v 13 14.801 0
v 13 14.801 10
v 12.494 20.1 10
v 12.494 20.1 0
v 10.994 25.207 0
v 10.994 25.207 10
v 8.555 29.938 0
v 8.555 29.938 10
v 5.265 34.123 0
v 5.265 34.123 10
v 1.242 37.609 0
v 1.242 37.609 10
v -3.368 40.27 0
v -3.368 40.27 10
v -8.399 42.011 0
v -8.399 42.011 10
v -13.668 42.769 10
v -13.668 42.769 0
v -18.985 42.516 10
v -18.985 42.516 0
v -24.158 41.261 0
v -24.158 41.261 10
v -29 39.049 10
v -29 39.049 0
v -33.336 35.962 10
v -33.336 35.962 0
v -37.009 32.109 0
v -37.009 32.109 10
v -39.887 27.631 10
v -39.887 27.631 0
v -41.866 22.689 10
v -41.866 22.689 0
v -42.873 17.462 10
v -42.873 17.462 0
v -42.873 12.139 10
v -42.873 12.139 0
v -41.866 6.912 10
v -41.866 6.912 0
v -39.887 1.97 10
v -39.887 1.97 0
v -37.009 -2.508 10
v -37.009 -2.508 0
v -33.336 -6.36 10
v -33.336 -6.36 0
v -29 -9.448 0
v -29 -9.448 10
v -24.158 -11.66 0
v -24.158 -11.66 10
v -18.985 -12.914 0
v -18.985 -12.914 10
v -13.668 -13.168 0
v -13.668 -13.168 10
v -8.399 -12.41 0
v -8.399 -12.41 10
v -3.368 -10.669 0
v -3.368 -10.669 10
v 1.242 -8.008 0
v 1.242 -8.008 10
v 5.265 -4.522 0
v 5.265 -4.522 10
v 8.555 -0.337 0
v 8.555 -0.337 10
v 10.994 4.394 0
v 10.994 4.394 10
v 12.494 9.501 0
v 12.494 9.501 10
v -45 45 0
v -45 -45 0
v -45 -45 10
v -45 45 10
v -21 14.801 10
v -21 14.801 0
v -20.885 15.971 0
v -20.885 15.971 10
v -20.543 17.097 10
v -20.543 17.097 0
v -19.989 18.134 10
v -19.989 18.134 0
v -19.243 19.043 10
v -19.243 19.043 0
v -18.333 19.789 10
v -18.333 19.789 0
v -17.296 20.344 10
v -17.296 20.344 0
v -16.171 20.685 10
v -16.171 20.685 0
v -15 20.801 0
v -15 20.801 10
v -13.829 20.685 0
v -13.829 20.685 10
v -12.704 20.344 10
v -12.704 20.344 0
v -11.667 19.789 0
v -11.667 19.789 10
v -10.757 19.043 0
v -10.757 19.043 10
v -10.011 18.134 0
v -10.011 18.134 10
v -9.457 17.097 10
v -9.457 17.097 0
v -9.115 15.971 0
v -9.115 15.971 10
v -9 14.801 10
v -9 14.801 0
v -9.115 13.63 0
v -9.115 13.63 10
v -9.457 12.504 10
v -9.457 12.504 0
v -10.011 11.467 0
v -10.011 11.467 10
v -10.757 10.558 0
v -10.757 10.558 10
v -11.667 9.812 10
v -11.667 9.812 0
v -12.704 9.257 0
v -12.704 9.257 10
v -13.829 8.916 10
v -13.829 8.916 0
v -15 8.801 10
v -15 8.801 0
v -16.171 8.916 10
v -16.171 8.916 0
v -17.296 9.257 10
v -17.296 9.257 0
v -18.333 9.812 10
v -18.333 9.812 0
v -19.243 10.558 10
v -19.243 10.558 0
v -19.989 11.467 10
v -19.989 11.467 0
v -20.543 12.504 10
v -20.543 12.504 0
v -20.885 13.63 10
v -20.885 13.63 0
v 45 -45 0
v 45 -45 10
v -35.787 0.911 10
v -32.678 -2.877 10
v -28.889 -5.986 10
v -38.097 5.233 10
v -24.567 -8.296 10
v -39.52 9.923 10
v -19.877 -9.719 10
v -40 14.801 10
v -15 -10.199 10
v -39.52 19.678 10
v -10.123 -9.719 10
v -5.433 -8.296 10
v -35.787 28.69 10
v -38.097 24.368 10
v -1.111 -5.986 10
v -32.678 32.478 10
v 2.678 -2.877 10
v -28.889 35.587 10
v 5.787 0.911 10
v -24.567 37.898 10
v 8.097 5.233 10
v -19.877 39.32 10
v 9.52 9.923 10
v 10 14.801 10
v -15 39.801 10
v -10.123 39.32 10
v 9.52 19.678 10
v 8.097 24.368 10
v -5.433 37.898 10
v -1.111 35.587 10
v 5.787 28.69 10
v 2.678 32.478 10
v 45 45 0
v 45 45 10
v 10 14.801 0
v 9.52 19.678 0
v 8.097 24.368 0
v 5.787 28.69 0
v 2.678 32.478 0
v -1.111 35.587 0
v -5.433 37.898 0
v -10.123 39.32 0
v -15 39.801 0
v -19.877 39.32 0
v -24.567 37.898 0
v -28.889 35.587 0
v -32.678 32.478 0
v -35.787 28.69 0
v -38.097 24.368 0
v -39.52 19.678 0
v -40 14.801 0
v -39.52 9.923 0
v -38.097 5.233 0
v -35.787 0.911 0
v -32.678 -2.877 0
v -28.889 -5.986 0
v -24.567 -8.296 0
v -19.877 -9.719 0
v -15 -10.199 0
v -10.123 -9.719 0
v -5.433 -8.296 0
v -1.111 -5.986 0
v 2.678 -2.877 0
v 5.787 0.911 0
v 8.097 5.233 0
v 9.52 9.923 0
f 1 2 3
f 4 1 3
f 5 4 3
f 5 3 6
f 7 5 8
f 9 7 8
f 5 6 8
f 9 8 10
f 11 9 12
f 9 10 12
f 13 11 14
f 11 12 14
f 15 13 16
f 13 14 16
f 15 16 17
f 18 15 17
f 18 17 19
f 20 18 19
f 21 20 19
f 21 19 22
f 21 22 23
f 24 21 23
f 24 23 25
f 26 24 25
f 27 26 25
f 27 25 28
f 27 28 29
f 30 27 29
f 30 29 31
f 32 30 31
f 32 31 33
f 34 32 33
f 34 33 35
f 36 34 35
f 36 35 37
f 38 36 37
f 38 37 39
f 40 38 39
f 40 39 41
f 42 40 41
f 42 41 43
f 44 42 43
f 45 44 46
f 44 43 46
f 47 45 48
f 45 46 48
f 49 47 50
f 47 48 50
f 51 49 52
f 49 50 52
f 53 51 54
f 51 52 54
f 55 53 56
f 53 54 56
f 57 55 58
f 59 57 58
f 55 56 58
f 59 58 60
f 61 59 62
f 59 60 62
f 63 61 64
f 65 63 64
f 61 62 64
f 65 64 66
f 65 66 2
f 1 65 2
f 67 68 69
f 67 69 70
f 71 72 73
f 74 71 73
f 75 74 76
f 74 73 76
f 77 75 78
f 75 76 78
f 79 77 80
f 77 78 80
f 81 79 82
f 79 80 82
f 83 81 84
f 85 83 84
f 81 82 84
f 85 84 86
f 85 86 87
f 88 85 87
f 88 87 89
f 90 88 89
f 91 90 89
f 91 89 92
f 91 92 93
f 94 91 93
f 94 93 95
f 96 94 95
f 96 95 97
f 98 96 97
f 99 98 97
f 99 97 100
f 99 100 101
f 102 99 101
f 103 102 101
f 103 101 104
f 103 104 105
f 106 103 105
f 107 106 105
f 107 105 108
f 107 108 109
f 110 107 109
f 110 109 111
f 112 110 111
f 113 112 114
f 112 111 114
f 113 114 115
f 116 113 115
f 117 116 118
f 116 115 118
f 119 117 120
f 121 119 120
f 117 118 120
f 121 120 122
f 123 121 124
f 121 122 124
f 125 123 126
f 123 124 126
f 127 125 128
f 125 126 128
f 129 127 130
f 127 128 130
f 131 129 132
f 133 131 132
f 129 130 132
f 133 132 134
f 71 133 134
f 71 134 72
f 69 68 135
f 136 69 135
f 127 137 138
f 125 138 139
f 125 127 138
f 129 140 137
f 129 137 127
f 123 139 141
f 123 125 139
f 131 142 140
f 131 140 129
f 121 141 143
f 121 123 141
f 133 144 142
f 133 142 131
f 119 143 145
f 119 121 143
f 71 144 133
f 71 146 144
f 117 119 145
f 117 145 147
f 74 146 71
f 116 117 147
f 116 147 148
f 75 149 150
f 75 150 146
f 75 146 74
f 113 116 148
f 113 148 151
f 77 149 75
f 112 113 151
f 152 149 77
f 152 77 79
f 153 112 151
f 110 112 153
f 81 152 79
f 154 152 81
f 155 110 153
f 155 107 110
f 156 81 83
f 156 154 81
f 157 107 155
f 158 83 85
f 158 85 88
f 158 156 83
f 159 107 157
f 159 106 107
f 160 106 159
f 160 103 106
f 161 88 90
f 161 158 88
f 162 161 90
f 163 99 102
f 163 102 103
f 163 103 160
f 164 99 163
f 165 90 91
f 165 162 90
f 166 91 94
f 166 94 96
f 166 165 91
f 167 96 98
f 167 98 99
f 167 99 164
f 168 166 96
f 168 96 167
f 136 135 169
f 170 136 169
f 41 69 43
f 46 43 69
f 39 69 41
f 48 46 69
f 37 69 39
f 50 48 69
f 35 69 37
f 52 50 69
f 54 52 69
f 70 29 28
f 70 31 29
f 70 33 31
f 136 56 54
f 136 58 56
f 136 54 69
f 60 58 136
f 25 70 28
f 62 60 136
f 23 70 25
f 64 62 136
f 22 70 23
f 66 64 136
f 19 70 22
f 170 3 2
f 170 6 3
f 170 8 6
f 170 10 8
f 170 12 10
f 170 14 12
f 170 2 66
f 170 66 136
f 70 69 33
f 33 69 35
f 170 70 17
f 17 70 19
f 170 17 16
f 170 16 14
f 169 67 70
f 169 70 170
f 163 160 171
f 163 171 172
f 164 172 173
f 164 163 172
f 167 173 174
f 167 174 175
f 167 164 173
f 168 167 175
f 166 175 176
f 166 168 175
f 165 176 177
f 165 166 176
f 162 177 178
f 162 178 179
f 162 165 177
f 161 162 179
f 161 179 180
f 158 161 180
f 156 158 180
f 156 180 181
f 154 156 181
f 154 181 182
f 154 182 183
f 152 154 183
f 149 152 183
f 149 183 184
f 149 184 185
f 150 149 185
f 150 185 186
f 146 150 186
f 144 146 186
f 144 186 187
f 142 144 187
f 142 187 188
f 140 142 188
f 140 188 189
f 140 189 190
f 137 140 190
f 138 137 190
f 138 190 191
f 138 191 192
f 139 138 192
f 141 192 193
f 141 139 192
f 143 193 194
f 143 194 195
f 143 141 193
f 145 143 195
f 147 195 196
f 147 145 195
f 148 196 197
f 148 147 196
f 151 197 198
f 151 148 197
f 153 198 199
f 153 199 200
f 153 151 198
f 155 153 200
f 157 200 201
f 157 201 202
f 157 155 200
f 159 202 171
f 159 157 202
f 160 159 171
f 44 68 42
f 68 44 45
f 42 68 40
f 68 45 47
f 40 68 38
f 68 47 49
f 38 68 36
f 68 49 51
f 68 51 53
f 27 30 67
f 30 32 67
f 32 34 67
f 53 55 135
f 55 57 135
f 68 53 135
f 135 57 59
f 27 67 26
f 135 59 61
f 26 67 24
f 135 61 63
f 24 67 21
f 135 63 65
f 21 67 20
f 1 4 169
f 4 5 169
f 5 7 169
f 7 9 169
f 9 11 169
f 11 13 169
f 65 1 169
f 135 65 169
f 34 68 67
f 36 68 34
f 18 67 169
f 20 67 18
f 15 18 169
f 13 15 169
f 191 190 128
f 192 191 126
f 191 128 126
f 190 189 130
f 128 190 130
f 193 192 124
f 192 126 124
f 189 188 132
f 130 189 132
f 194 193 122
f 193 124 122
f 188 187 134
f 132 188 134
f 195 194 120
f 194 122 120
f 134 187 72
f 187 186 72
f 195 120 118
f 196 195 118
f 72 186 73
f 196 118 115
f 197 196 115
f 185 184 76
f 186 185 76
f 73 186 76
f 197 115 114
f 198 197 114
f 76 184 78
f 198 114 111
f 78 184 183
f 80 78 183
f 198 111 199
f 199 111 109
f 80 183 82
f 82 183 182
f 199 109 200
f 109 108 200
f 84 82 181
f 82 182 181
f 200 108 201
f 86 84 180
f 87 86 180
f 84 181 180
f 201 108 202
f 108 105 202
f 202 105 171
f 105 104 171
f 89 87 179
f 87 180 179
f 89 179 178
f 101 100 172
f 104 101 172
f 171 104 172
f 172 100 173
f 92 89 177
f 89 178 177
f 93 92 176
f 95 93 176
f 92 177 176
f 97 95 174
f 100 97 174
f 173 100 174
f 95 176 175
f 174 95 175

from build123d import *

# Parameters (mm, degrees)
F0_W     = 90
F0_H     = 90
F1_DEPTH = 10
F3_D     = 12
F4_R     = 28
F4_R_2   = 25
F5_DEPTH = 10.001


with BuildPart() as f1:
    # F0 (on Top) → F1 (new body)
    with BuildSketch(Plane.XY):
        Rectangle(F0_W, F0_H)
    extrude(amount=F1_DEPTH)

    # F3 (through all)
    with Locations(Plane.XY.offset(10)):
        with Locations((-15, 14.800516)):
            Hole(F3_D / 2)

    # F4 (on face) → F5 (cut, through all)
    with BuildSketch(Plane.XY.offset(10)):
        with Locations((-15, 14.800516)):
            Circle(F4_R)
        with Locations((-15, 14.800516)):
            Circle(F4_R_2, mode=Mode.SUBTRACT)
    extrude(amount=-F5_DEPTH, mode=Mode.SUBTRACT)


solid = f1.part
